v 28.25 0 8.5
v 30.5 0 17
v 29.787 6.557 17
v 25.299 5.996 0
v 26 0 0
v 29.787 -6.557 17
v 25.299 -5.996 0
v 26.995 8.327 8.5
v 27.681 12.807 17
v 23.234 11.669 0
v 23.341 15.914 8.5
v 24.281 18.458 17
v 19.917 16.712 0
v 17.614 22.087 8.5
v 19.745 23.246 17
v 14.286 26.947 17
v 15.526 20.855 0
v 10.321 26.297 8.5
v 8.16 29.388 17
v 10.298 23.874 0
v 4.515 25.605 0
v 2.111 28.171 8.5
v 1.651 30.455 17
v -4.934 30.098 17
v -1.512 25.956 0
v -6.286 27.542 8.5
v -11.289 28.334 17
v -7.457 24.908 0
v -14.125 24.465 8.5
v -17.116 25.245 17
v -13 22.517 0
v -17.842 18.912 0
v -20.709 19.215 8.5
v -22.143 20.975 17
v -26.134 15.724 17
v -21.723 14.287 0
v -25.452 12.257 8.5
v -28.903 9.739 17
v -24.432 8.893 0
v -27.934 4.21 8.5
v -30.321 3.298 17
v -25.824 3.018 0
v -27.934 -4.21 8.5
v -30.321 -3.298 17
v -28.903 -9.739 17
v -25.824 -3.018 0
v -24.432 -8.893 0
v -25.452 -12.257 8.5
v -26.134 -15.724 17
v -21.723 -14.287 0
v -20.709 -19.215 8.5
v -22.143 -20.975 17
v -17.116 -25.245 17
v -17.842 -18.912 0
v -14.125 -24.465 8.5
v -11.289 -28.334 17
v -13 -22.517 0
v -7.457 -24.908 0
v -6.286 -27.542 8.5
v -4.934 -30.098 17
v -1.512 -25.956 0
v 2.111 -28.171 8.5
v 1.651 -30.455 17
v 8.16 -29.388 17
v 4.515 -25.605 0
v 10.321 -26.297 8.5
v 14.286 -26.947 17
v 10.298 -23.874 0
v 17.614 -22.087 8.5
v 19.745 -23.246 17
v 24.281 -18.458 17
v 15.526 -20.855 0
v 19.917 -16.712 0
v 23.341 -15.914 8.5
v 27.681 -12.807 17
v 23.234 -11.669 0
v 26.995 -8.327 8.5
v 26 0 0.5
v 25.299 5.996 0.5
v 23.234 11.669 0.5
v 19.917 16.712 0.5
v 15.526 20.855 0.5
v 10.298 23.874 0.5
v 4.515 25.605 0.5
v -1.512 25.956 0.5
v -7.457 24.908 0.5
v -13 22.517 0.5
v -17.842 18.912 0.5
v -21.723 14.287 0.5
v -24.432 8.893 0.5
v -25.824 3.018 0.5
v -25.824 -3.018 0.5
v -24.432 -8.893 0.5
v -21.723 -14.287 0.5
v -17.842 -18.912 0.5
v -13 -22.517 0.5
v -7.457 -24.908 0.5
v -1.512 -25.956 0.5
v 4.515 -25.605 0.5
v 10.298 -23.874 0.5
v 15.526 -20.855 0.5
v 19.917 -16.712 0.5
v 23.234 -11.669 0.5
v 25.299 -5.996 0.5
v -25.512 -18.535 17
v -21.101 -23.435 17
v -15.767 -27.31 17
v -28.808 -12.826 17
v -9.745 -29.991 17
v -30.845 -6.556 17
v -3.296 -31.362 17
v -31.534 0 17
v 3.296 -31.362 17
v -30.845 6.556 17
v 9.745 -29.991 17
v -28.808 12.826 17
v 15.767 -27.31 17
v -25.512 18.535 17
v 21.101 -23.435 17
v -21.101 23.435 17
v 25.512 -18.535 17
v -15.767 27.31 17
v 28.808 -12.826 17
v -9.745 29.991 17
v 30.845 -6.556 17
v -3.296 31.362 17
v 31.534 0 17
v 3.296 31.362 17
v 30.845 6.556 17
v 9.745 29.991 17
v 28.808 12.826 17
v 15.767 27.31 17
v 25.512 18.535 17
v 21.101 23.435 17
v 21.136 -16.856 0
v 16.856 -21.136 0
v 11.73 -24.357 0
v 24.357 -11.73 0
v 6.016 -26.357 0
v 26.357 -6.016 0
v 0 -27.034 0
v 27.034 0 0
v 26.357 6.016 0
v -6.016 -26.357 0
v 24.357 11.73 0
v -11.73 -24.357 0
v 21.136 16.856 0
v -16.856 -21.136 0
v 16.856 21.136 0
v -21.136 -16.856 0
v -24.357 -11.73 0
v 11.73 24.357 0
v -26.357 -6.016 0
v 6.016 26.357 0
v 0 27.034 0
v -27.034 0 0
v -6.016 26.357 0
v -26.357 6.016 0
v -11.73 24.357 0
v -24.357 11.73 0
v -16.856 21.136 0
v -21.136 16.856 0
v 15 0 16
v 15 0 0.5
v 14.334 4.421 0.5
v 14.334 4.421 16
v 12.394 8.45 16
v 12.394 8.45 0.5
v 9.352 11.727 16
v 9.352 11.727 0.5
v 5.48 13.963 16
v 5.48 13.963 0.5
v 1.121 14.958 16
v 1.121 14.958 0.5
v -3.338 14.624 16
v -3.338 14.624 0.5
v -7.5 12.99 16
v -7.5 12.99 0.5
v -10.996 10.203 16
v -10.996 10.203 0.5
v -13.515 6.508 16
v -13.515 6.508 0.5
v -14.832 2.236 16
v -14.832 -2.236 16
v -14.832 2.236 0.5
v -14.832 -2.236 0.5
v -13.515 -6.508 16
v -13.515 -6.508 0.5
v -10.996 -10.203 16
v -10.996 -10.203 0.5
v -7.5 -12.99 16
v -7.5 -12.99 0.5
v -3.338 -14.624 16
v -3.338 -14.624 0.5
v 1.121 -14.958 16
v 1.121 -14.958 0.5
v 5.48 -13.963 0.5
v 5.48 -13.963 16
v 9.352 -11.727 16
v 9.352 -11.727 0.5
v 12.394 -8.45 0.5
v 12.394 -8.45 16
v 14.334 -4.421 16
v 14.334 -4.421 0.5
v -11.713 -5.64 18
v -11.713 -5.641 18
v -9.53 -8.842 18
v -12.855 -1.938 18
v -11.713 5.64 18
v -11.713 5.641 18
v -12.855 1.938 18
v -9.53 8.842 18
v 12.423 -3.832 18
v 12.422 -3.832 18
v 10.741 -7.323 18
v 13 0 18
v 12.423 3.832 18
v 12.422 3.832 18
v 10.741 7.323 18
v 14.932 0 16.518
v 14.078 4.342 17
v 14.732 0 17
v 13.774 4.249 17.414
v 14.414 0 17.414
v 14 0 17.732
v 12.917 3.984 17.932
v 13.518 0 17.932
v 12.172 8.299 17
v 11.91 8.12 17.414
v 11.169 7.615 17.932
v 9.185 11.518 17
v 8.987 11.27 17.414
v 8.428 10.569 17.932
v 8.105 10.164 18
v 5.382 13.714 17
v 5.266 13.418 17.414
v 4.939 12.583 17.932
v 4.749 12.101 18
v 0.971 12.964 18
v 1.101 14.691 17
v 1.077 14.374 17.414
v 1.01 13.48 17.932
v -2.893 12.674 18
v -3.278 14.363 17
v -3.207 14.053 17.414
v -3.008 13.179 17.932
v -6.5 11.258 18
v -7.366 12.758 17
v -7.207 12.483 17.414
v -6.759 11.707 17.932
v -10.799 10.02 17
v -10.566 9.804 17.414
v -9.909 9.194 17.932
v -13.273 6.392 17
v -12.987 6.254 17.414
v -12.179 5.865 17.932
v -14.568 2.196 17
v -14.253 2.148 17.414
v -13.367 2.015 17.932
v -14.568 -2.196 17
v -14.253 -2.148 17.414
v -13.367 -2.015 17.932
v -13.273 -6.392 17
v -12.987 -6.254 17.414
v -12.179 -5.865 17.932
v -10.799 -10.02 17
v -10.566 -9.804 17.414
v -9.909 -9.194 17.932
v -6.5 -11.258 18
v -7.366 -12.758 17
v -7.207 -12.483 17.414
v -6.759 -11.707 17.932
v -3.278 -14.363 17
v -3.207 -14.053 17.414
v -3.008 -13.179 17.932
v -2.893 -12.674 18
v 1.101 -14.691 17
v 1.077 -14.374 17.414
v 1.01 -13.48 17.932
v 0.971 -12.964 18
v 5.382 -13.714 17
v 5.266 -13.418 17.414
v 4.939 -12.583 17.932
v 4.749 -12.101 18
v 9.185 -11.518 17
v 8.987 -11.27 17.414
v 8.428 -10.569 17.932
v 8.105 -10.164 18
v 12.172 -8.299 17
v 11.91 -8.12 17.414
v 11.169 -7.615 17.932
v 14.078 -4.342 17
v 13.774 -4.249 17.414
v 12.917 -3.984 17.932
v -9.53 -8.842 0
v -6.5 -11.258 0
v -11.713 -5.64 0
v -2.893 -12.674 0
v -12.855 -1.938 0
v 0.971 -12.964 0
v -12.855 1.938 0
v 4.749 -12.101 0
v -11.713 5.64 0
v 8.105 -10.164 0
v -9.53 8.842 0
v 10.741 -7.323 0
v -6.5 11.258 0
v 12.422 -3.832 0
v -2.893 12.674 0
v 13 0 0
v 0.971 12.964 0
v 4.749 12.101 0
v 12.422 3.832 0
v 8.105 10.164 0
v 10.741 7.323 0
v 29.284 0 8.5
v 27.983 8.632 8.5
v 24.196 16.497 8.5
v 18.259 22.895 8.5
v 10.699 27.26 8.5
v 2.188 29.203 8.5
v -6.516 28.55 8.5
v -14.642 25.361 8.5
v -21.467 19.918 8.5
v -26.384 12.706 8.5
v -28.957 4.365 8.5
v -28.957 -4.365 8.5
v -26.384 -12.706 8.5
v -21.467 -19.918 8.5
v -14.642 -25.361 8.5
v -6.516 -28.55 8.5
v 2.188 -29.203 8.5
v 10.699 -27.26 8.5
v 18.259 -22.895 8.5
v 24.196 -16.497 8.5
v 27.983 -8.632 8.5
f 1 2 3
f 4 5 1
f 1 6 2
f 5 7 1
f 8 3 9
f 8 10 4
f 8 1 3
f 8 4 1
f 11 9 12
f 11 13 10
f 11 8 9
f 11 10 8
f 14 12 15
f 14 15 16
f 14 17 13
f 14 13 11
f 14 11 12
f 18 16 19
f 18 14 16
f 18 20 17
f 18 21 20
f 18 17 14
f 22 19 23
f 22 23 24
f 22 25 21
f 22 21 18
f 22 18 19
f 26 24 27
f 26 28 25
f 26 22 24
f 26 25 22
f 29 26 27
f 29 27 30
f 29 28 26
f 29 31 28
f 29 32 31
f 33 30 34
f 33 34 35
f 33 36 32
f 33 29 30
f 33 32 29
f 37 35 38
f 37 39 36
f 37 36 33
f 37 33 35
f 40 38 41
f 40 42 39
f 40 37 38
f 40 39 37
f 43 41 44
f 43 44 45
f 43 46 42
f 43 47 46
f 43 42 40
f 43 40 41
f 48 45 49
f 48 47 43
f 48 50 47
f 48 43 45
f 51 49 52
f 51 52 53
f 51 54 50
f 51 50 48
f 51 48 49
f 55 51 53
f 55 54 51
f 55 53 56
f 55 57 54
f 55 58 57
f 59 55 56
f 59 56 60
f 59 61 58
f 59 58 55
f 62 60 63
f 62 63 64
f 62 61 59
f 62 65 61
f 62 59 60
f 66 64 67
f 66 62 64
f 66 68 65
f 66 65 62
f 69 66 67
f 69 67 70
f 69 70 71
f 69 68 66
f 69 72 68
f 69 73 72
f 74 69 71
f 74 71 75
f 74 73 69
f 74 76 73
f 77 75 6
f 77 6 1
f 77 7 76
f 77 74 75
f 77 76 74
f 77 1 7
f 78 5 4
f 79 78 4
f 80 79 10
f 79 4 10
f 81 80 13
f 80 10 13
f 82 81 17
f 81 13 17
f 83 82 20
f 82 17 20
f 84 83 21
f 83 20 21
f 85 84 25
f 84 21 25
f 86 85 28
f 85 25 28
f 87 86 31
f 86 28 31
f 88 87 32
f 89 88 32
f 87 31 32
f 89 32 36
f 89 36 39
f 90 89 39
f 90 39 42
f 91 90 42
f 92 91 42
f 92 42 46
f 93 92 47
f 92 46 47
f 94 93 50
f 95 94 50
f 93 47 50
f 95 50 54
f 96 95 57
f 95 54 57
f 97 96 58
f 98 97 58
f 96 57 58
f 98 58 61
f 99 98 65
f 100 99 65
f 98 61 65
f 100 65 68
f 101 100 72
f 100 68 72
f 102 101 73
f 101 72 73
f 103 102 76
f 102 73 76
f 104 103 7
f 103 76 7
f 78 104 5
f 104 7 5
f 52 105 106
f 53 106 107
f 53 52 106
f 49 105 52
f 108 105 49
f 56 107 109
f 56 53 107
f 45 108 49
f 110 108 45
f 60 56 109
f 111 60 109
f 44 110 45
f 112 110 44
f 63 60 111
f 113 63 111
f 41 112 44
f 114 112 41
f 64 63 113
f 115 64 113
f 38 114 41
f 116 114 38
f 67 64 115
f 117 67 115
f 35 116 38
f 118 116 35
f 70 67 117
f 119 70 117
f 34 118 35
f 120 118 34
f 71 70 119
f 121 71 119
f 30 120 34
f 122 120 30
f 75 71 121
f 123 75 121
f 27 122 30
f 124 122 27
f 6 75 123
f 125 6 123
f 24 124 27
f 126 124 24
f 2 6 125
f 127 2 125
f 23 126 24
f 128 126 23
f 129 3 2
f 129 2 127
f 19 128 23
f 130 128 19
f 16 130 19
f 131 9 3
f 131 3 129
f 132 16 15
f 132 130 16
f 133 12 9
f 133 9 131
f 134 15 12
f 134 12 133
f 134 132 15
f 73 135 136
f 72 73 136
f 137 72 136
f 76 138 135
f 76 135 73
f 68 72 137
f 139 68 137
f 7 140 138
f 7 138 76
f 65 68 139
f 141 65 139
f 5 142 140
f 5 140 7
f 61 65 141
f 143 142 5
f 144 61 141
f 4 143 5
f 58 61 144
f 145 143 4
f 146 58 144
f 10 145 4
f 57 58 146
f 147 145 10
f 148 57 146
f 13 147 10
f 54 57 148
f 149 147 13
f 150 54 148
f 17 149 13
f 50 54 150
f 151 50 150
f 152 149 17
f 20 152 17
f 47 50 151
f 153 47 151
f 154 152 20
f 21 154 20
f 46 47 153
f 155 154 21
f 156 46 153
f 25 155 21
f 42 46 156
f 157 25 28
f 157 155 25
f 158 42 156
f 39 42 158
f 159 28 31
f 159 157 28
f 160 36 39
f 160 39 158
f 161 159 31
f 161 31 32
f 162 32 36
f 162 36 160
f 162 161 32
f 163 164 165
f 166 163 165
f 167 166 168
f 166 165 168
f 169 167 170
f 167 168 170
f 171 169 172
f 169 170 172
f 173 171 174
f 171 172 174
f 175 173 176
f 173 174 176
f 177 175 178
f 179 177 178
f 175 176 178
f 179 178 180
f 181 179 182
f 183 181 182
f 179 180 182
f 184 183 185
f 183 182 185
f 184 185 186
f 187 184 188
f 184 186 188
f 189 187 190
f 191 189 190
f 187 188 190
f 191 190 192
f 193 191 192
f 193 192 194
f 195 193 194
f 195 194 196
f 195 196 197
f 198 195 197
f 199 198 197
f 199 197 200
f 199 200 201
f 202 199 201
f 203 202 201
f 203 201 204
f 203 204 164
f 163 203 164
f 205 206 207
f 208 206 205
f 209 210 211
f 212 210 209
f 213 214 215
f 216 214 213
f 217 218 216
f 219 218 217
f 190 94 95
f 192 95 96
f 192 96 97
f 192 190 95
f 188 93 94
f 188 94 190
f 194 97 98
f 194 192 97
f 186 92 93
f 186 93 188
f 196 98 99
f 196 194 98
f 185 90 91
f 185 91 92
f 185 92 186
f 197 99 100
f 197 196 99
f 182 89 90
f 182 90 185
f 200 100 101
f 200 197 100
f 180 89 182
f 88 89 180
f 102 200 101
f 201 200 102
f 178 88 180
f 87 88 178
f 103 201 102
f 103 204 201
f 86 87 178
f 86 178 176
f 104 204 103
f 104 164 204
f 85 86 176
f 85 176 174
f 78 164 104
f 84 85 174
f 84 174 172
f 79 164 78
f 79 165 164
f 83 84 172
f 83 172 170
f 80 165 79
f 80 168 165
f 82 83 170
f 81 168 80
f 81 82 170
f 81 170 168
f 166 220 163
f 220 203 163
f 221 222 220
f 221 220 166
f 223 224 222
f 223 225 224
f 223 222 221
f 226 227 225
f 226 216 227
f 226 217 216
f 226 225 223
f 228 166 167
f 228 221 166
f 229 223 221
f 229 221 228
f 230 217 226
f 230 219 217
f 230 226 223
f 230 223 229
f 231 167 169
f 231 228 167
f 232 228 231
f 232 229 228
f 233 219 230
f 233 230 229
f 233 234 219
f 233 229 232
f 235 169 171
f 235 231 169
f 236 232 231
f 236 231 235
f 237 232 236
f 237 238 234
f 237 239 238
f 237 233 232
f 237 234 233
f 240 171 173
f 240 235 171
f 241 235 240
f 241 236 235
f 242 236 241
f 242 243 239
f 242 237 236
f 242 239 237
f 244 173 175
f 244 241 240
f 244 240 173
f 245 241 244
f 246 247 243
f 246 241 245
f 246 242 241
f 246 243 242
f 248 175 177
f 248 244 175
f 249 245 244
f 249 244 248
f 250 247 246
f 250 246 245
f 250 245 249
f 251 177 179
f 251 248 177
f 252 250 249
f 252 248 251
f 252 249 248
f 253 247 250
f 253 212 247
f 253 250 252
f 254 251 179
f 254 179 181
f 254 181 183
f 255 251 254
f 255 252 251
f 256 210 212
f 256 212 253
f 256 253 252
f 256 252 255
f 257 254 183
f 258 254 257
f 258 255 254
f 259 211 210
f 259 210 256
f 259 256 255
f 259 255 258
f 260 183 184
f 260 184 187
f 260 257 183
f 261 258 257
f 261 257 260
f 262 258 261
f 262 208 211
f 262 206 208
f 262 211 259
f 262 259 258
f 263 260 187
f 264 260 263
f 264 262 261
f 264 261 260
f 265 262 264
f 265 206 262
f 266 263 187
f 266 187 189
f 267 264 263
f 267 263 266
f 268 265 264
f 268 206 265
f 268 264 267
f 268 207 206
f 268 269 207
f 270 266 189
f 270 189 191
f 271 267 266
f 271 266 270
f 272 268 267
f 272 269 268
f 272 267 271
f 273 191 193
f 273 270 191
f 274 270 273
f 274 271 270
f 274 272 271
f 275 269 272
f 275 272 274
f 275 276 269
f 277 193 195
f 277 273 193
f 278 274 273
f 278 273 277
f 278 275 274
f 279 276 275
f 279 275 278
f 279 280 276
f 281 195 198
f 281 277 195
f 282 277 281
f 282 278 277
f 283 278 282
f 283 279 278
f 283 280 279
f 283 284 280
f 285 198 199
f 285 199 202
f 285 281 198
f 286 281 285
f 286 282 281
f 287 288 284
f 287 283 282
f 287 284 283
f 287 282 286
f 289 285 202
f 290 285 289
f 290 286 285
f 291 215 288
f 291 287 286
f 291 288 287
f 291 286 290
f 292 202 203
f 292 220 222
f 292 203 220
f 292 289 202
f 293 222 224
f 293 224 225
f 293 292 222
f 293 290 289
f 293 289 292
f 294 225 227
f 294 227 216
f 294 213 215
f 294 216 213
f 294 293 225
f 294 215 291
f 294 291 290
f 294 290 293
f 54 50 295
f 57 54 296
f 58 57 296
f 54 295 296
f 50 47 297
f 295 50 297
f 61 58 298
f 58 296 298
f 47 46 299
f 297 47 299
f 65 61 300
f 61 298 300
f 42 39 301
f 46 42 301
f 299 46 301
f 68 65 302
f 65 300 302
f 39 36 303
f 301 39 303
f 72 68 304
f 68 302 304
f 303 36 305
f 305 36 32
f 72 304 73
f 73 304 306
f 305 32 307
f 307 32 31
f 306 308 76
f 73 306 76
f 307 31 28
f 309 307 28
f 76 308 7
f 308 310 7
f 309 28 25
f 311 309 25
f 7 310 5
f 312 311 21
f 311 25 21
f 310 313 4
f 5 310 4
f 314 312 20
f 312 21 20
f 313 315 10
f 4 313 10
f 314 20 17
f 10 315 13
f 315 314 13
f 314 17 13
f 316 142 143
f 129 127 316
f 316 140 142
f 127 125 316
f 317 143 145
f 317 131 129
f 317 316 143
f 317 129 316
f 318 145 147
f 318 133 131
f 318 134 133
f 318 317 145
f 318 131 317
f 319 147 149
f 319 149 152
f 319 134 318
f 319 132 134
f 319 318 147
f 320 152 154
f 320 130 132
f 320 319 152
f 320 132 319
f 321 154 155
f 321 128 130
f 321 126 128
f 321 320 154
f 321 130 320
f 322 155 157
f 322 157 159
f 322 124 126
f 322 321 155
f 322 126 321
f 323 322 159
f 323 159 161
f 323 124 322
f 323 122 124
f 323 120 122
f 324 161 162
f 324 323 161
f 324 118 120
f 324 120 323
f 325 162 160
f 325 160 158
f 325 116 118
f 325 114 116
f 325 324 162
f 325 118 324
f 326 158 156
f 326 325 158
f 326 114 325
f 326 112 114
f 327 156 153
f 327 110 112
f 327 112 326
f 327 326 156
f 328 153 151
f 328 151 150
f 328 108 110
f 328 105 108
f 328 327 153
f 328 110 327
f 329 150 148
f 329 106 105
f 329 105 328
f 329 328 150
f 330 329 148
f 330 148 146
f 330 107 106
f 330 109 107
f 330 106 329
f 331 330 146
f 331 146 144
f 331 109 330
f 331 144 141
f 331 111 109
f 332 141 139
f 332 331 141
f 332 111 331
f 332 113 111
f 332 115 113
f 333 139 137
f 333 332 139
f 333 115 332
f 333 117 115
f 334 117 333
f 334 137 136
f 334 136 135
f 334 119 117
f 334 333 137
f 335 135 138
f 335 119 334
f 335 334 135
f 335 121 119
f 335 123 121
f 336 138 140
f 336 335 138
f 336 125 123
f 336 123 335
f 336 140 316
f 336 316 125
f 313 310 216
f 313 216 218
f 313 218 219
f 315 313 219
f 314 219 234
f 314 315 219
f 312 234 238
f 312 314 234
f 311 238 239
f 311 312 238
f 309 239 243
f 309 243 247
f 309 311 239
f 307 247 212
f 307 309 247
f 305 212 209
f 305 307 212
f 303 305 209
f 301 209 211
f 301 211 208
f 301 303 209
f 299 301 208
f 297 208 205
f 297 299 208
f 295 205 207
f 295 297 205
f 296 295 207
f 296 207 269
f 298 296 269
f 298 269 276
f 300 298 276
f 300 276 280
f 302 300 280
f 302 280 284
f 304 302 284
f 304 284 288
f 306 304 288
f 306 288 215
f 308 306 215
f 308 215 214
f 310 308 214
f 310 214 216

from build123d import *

# Parameters (mm, degrees)
SKETCH_1_R        = 26
SKETCH_1_R_2      = 13
EXTRUDE_1_DEPTH   = 0.5
SKETCH_7_R        = 15
SKETCH_7_R_2      = 13
EXTRUDE_1_2_DEPTH = 18
FILLET_4_R        = 2


# Read off the part's stored shape, not the designer's step: По сечениям-Тонкостенный1
with BuildPart() as part:
    # Эскиз1 → Extrude 1 (new body)
    with BuildSketch(Plane.XY):
        Circle(SKETCH_1_R)
        Circle(SKETCH_1_R_2, mode=Mode.SUBTRACT)
    extrude(amount=EXTRUDE_1_DEPTH)

    # Эскиз7 → Extrude 1 2 (add)
    with BuildSketch(Plane.XY):
        Circle(SKETCH_7_R)
        Circle(SKETCH_7_R_2, mode=Mode.SUBTRACT)
    extrude(amount=EXTRUDE_1_2_DEPTH)

    # Скругление4
    fillet_4_edges = [part.edges().sort_by_distance(p)[0] for p in [
        (-15, 0, 18),
    ]]
    fillet(fillet_4_edges, radius=FILLET_4_R - 0.0001)  # a hair under: the kernel refuses the full size


with BuildPart() as body_2:
    # По сечениям-Тонкостенный1 outline → По сечениям-Тонкостенный1 (revolve)
    with BuildSketch(Plane.XZ):
        Polygon((30.5, 17), (26, 0), (27.034441494, 0), (31.534441494, 17), align=None)
    revolve(axis=Axis((0, 0, 0), (0, 0, 1)))


solid = Compound([part.part, body_2.part])
